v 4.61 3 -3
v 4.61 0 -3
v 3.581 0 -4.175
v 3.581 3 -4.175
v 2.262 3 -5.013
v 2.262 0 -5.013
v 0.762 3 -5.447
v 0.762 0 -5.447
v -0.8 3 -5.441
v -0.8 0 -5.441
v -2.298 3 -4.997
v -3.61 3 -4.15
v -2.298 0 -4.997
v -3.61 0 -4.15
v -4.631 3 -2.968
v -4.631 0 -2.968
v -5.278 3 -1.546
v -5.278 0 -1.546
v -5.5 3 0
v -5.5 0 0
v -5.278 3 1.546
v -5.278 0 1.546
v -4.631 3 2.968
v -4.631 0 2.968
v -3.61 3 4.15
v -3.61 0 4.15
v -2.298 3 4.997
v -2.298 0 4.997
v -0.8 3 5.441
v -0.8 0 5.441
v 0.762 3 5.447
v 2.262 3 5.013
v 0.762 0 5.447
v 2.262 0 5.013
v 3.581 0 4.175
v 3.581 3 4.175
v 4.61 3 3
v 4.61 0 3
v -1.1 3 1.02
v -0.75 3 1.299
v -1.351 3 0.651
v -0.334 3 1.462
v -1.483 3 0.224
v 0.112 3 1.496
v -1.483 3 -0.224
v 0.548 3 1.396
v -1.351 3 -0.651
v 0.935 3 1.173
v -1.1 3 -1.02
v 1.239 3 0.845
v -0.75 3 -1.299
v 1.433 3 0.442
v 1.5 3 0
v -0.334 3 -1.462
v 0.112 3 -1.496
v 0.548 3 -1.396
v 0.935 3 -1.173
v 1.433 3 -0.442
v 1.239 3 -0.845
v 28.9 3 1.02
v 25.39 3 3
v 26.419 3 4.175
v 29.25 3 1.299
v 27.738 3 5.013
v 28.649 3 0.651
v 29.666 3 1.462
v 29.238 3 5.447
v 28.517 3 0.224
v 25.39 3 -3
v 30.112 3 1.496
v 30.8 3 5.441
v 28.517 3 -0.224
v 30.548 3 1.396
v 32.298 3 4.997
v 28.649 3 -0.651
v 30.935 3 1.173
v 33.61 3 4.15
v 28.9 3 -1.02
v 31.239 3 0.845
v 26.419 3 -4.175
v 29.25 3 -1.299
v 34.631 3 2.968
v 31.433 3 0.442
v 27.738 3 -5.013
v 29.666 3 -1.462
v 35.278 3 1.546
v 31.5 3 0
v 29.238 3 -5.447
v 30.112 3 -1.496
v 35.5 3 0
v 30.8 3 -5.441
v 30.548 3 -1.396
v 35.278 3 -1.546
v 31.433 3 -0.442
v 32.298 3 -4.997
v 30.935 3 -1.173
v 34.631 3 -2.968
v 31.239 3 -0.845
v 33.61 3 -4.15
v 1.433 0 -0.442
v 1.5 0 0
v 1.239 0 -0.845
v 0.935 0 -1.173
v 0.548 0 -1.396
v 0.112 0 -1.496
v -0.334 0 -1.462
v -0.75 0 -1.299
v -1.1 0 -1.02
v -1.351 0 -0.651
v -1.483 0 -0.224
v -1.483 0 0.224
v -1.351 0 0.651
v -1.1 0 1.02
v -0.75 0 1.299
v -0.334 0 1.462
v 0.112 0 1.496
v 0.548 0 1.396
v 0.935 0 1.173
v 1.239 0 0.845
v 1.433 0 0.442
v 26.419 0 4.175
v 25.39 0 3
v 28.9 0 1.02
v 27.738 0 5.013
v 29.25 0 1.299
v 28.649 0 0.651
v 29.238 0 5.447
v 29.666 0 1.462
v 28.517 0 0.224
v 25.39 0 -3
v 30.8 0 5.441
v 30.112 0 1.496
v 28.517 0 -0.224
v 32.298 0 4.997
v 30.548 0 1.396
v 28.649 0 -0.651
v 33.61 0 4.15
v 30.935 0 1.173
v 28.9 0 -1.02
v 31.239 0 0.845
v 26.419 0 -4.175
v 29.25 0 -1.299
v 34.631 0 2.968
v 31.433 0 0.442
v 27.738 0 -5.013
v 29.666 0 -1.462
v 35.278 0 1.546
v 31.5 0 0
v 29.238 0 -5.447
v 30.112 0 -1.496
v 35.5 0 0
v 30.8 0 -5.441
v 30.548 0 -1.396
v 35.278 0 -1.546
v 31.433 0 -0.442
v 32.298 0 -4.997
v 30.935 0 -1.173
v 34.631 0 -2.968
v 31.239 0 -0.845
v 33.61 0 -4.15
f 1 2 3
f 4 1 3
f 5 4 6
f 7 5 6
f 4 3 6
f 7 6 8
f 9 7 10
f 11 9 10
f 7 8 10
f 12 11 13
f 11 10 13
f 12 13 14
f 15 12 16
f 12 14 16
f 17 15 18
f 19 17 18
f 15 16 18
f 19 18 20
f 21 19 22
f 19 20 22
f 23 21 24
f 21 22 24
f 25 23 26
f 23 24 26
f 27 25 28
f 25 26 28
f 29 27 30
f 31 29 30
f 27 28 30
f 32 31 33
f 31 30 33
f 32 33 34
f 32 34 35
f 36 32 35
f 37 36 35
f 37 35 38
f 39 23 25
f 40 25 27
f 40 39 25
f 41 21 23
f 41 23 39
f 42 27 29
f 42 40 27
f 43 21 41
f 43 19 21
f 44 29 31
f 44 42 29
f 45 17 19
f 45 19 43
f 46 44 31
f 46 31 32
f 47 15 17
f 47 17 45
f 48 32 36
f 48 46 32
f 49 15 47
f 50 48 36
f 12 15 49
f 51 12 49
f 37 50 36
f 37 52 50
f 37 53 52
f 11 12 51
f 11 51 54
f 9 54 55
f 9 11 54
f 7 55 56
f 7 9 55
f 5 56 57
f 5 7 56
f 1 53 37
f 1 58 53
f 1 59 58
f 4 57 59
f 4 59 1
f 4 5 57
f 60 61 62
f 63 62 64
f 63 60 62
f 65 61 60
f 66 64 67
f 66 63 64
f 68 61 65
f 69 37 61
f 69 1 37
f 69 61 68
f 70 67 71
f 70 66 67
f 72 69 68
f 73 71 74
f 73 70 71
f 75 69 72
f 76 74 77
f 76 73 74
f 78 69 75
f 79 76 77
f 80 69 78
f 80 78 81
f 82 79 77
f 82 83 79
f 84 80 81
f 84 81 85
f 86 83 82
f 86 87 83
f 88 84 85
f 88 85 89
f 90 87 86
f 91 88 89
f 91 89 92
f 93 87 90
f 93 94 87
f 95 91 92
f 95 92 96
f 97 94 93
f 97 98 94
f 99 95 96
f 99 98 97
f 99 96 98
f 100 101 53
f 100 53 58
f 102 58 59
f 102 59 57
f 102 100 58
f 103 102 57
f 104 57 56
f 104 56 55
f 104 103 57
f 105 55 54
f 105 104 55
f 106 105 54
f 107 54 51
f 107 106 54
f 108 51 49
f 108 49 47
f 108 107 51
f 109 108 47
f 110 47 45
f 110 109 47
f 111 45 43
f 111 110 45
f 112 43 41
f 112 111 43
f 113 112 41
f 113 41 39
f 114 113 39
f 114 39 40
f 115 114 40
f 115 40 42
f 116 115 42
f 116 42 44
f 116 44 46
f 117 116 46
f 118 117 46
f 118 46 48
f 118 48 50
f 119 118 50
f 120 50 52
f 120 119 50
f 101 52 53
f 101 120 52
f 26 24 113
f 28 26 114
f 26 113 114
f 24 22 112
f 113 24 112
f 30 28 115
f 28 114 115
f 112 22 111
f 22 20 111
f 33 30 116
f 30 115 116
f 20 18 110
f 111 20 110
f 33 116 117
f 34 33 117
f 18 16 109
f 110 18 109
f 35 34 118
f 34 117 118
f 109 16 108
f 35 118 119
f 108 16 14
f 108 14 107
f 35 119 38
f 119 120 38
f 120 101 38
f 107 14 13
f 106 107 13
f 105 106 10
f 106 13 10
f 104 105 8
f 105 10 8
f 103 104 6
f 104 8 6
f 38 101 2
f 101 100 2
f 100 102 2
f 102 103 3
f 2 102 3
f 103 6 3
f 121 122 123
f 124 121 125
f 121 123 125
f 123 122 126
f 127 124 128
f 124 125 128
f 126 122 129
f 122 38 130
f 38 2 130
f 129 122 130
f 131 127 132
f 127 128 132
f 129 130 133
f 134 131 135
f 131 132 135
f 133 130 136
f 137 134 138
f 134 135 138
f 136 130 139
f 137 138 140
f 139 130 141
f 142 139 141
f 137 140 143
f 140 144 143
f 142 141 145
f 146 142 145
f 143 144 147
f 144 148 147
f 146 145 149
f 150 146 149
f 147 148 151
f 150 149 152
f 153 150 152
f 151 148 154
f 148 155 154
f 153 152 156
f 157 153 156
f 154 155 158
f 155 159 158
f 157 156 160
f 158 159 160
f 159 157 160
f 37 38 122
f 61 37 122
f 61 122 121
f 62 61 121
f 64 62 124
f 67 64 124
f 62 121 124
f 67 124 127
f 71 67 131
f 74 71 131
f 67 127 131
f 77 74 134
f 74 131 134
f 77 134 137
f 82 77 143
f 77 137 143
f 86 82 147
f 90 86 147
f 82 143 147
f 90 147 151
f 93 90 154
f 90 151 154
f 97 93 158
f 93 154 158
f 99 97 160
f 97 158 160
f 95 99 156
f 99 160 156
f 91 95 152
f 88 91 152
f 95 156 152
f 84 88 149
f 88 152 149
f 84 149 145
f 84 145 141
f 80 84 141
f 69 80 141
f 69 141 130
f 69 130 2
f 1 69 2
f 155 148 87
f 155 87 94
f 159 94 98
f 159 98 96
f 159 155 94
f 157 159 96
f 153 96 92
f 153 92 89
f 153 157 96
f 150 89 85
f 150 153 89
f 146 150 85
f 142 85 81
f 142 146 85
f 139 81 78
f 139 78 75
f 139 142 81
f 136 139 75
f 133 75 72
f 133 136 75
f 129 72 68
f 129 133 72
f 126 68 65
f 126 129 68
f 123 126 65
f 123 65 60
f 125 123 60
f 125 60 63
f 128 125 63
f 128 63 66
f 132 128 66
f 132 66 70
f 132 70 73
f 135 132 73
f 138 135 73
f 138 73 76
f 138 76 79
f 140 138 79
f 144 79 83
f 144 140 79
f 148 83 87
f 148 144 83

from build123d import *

# Parameters (mm, degrees)
SKETCH1_R           = 1.5
BOSS_EXTRUDE1_DEPTH = 3


with BuildPart() as part:
    # Sketch1 → Boss-Extrude1 (new body)
    with BuildSketch(Plane(origin=(0, 0, 0), x_dir=(1, 0, 0), z_dir=(0, 1, 0))):
        with BuildLine():
            ThreePointArc((4.609772229, 3), (-5.5, 0), (4.609772229, -3))
            Line((4.609772229, -3), (25.390227771, -3))
            ThreePointArc((25.390227771, -3), (35.5, 0), (25.390227771, 3))
            Line((25.390227771, 3), (4.609772229, 3))
        make_face()
        Circle(SKETCH1_R, mode=Mode.SUBTRACT)
        with Locations((30, 0)):
            Circle(SKETCH1_R, mode=Mode.SUBTRACT)
    extrude(amount=BOSS_EXTRUDE1_DEPTH)


solid = part.part
